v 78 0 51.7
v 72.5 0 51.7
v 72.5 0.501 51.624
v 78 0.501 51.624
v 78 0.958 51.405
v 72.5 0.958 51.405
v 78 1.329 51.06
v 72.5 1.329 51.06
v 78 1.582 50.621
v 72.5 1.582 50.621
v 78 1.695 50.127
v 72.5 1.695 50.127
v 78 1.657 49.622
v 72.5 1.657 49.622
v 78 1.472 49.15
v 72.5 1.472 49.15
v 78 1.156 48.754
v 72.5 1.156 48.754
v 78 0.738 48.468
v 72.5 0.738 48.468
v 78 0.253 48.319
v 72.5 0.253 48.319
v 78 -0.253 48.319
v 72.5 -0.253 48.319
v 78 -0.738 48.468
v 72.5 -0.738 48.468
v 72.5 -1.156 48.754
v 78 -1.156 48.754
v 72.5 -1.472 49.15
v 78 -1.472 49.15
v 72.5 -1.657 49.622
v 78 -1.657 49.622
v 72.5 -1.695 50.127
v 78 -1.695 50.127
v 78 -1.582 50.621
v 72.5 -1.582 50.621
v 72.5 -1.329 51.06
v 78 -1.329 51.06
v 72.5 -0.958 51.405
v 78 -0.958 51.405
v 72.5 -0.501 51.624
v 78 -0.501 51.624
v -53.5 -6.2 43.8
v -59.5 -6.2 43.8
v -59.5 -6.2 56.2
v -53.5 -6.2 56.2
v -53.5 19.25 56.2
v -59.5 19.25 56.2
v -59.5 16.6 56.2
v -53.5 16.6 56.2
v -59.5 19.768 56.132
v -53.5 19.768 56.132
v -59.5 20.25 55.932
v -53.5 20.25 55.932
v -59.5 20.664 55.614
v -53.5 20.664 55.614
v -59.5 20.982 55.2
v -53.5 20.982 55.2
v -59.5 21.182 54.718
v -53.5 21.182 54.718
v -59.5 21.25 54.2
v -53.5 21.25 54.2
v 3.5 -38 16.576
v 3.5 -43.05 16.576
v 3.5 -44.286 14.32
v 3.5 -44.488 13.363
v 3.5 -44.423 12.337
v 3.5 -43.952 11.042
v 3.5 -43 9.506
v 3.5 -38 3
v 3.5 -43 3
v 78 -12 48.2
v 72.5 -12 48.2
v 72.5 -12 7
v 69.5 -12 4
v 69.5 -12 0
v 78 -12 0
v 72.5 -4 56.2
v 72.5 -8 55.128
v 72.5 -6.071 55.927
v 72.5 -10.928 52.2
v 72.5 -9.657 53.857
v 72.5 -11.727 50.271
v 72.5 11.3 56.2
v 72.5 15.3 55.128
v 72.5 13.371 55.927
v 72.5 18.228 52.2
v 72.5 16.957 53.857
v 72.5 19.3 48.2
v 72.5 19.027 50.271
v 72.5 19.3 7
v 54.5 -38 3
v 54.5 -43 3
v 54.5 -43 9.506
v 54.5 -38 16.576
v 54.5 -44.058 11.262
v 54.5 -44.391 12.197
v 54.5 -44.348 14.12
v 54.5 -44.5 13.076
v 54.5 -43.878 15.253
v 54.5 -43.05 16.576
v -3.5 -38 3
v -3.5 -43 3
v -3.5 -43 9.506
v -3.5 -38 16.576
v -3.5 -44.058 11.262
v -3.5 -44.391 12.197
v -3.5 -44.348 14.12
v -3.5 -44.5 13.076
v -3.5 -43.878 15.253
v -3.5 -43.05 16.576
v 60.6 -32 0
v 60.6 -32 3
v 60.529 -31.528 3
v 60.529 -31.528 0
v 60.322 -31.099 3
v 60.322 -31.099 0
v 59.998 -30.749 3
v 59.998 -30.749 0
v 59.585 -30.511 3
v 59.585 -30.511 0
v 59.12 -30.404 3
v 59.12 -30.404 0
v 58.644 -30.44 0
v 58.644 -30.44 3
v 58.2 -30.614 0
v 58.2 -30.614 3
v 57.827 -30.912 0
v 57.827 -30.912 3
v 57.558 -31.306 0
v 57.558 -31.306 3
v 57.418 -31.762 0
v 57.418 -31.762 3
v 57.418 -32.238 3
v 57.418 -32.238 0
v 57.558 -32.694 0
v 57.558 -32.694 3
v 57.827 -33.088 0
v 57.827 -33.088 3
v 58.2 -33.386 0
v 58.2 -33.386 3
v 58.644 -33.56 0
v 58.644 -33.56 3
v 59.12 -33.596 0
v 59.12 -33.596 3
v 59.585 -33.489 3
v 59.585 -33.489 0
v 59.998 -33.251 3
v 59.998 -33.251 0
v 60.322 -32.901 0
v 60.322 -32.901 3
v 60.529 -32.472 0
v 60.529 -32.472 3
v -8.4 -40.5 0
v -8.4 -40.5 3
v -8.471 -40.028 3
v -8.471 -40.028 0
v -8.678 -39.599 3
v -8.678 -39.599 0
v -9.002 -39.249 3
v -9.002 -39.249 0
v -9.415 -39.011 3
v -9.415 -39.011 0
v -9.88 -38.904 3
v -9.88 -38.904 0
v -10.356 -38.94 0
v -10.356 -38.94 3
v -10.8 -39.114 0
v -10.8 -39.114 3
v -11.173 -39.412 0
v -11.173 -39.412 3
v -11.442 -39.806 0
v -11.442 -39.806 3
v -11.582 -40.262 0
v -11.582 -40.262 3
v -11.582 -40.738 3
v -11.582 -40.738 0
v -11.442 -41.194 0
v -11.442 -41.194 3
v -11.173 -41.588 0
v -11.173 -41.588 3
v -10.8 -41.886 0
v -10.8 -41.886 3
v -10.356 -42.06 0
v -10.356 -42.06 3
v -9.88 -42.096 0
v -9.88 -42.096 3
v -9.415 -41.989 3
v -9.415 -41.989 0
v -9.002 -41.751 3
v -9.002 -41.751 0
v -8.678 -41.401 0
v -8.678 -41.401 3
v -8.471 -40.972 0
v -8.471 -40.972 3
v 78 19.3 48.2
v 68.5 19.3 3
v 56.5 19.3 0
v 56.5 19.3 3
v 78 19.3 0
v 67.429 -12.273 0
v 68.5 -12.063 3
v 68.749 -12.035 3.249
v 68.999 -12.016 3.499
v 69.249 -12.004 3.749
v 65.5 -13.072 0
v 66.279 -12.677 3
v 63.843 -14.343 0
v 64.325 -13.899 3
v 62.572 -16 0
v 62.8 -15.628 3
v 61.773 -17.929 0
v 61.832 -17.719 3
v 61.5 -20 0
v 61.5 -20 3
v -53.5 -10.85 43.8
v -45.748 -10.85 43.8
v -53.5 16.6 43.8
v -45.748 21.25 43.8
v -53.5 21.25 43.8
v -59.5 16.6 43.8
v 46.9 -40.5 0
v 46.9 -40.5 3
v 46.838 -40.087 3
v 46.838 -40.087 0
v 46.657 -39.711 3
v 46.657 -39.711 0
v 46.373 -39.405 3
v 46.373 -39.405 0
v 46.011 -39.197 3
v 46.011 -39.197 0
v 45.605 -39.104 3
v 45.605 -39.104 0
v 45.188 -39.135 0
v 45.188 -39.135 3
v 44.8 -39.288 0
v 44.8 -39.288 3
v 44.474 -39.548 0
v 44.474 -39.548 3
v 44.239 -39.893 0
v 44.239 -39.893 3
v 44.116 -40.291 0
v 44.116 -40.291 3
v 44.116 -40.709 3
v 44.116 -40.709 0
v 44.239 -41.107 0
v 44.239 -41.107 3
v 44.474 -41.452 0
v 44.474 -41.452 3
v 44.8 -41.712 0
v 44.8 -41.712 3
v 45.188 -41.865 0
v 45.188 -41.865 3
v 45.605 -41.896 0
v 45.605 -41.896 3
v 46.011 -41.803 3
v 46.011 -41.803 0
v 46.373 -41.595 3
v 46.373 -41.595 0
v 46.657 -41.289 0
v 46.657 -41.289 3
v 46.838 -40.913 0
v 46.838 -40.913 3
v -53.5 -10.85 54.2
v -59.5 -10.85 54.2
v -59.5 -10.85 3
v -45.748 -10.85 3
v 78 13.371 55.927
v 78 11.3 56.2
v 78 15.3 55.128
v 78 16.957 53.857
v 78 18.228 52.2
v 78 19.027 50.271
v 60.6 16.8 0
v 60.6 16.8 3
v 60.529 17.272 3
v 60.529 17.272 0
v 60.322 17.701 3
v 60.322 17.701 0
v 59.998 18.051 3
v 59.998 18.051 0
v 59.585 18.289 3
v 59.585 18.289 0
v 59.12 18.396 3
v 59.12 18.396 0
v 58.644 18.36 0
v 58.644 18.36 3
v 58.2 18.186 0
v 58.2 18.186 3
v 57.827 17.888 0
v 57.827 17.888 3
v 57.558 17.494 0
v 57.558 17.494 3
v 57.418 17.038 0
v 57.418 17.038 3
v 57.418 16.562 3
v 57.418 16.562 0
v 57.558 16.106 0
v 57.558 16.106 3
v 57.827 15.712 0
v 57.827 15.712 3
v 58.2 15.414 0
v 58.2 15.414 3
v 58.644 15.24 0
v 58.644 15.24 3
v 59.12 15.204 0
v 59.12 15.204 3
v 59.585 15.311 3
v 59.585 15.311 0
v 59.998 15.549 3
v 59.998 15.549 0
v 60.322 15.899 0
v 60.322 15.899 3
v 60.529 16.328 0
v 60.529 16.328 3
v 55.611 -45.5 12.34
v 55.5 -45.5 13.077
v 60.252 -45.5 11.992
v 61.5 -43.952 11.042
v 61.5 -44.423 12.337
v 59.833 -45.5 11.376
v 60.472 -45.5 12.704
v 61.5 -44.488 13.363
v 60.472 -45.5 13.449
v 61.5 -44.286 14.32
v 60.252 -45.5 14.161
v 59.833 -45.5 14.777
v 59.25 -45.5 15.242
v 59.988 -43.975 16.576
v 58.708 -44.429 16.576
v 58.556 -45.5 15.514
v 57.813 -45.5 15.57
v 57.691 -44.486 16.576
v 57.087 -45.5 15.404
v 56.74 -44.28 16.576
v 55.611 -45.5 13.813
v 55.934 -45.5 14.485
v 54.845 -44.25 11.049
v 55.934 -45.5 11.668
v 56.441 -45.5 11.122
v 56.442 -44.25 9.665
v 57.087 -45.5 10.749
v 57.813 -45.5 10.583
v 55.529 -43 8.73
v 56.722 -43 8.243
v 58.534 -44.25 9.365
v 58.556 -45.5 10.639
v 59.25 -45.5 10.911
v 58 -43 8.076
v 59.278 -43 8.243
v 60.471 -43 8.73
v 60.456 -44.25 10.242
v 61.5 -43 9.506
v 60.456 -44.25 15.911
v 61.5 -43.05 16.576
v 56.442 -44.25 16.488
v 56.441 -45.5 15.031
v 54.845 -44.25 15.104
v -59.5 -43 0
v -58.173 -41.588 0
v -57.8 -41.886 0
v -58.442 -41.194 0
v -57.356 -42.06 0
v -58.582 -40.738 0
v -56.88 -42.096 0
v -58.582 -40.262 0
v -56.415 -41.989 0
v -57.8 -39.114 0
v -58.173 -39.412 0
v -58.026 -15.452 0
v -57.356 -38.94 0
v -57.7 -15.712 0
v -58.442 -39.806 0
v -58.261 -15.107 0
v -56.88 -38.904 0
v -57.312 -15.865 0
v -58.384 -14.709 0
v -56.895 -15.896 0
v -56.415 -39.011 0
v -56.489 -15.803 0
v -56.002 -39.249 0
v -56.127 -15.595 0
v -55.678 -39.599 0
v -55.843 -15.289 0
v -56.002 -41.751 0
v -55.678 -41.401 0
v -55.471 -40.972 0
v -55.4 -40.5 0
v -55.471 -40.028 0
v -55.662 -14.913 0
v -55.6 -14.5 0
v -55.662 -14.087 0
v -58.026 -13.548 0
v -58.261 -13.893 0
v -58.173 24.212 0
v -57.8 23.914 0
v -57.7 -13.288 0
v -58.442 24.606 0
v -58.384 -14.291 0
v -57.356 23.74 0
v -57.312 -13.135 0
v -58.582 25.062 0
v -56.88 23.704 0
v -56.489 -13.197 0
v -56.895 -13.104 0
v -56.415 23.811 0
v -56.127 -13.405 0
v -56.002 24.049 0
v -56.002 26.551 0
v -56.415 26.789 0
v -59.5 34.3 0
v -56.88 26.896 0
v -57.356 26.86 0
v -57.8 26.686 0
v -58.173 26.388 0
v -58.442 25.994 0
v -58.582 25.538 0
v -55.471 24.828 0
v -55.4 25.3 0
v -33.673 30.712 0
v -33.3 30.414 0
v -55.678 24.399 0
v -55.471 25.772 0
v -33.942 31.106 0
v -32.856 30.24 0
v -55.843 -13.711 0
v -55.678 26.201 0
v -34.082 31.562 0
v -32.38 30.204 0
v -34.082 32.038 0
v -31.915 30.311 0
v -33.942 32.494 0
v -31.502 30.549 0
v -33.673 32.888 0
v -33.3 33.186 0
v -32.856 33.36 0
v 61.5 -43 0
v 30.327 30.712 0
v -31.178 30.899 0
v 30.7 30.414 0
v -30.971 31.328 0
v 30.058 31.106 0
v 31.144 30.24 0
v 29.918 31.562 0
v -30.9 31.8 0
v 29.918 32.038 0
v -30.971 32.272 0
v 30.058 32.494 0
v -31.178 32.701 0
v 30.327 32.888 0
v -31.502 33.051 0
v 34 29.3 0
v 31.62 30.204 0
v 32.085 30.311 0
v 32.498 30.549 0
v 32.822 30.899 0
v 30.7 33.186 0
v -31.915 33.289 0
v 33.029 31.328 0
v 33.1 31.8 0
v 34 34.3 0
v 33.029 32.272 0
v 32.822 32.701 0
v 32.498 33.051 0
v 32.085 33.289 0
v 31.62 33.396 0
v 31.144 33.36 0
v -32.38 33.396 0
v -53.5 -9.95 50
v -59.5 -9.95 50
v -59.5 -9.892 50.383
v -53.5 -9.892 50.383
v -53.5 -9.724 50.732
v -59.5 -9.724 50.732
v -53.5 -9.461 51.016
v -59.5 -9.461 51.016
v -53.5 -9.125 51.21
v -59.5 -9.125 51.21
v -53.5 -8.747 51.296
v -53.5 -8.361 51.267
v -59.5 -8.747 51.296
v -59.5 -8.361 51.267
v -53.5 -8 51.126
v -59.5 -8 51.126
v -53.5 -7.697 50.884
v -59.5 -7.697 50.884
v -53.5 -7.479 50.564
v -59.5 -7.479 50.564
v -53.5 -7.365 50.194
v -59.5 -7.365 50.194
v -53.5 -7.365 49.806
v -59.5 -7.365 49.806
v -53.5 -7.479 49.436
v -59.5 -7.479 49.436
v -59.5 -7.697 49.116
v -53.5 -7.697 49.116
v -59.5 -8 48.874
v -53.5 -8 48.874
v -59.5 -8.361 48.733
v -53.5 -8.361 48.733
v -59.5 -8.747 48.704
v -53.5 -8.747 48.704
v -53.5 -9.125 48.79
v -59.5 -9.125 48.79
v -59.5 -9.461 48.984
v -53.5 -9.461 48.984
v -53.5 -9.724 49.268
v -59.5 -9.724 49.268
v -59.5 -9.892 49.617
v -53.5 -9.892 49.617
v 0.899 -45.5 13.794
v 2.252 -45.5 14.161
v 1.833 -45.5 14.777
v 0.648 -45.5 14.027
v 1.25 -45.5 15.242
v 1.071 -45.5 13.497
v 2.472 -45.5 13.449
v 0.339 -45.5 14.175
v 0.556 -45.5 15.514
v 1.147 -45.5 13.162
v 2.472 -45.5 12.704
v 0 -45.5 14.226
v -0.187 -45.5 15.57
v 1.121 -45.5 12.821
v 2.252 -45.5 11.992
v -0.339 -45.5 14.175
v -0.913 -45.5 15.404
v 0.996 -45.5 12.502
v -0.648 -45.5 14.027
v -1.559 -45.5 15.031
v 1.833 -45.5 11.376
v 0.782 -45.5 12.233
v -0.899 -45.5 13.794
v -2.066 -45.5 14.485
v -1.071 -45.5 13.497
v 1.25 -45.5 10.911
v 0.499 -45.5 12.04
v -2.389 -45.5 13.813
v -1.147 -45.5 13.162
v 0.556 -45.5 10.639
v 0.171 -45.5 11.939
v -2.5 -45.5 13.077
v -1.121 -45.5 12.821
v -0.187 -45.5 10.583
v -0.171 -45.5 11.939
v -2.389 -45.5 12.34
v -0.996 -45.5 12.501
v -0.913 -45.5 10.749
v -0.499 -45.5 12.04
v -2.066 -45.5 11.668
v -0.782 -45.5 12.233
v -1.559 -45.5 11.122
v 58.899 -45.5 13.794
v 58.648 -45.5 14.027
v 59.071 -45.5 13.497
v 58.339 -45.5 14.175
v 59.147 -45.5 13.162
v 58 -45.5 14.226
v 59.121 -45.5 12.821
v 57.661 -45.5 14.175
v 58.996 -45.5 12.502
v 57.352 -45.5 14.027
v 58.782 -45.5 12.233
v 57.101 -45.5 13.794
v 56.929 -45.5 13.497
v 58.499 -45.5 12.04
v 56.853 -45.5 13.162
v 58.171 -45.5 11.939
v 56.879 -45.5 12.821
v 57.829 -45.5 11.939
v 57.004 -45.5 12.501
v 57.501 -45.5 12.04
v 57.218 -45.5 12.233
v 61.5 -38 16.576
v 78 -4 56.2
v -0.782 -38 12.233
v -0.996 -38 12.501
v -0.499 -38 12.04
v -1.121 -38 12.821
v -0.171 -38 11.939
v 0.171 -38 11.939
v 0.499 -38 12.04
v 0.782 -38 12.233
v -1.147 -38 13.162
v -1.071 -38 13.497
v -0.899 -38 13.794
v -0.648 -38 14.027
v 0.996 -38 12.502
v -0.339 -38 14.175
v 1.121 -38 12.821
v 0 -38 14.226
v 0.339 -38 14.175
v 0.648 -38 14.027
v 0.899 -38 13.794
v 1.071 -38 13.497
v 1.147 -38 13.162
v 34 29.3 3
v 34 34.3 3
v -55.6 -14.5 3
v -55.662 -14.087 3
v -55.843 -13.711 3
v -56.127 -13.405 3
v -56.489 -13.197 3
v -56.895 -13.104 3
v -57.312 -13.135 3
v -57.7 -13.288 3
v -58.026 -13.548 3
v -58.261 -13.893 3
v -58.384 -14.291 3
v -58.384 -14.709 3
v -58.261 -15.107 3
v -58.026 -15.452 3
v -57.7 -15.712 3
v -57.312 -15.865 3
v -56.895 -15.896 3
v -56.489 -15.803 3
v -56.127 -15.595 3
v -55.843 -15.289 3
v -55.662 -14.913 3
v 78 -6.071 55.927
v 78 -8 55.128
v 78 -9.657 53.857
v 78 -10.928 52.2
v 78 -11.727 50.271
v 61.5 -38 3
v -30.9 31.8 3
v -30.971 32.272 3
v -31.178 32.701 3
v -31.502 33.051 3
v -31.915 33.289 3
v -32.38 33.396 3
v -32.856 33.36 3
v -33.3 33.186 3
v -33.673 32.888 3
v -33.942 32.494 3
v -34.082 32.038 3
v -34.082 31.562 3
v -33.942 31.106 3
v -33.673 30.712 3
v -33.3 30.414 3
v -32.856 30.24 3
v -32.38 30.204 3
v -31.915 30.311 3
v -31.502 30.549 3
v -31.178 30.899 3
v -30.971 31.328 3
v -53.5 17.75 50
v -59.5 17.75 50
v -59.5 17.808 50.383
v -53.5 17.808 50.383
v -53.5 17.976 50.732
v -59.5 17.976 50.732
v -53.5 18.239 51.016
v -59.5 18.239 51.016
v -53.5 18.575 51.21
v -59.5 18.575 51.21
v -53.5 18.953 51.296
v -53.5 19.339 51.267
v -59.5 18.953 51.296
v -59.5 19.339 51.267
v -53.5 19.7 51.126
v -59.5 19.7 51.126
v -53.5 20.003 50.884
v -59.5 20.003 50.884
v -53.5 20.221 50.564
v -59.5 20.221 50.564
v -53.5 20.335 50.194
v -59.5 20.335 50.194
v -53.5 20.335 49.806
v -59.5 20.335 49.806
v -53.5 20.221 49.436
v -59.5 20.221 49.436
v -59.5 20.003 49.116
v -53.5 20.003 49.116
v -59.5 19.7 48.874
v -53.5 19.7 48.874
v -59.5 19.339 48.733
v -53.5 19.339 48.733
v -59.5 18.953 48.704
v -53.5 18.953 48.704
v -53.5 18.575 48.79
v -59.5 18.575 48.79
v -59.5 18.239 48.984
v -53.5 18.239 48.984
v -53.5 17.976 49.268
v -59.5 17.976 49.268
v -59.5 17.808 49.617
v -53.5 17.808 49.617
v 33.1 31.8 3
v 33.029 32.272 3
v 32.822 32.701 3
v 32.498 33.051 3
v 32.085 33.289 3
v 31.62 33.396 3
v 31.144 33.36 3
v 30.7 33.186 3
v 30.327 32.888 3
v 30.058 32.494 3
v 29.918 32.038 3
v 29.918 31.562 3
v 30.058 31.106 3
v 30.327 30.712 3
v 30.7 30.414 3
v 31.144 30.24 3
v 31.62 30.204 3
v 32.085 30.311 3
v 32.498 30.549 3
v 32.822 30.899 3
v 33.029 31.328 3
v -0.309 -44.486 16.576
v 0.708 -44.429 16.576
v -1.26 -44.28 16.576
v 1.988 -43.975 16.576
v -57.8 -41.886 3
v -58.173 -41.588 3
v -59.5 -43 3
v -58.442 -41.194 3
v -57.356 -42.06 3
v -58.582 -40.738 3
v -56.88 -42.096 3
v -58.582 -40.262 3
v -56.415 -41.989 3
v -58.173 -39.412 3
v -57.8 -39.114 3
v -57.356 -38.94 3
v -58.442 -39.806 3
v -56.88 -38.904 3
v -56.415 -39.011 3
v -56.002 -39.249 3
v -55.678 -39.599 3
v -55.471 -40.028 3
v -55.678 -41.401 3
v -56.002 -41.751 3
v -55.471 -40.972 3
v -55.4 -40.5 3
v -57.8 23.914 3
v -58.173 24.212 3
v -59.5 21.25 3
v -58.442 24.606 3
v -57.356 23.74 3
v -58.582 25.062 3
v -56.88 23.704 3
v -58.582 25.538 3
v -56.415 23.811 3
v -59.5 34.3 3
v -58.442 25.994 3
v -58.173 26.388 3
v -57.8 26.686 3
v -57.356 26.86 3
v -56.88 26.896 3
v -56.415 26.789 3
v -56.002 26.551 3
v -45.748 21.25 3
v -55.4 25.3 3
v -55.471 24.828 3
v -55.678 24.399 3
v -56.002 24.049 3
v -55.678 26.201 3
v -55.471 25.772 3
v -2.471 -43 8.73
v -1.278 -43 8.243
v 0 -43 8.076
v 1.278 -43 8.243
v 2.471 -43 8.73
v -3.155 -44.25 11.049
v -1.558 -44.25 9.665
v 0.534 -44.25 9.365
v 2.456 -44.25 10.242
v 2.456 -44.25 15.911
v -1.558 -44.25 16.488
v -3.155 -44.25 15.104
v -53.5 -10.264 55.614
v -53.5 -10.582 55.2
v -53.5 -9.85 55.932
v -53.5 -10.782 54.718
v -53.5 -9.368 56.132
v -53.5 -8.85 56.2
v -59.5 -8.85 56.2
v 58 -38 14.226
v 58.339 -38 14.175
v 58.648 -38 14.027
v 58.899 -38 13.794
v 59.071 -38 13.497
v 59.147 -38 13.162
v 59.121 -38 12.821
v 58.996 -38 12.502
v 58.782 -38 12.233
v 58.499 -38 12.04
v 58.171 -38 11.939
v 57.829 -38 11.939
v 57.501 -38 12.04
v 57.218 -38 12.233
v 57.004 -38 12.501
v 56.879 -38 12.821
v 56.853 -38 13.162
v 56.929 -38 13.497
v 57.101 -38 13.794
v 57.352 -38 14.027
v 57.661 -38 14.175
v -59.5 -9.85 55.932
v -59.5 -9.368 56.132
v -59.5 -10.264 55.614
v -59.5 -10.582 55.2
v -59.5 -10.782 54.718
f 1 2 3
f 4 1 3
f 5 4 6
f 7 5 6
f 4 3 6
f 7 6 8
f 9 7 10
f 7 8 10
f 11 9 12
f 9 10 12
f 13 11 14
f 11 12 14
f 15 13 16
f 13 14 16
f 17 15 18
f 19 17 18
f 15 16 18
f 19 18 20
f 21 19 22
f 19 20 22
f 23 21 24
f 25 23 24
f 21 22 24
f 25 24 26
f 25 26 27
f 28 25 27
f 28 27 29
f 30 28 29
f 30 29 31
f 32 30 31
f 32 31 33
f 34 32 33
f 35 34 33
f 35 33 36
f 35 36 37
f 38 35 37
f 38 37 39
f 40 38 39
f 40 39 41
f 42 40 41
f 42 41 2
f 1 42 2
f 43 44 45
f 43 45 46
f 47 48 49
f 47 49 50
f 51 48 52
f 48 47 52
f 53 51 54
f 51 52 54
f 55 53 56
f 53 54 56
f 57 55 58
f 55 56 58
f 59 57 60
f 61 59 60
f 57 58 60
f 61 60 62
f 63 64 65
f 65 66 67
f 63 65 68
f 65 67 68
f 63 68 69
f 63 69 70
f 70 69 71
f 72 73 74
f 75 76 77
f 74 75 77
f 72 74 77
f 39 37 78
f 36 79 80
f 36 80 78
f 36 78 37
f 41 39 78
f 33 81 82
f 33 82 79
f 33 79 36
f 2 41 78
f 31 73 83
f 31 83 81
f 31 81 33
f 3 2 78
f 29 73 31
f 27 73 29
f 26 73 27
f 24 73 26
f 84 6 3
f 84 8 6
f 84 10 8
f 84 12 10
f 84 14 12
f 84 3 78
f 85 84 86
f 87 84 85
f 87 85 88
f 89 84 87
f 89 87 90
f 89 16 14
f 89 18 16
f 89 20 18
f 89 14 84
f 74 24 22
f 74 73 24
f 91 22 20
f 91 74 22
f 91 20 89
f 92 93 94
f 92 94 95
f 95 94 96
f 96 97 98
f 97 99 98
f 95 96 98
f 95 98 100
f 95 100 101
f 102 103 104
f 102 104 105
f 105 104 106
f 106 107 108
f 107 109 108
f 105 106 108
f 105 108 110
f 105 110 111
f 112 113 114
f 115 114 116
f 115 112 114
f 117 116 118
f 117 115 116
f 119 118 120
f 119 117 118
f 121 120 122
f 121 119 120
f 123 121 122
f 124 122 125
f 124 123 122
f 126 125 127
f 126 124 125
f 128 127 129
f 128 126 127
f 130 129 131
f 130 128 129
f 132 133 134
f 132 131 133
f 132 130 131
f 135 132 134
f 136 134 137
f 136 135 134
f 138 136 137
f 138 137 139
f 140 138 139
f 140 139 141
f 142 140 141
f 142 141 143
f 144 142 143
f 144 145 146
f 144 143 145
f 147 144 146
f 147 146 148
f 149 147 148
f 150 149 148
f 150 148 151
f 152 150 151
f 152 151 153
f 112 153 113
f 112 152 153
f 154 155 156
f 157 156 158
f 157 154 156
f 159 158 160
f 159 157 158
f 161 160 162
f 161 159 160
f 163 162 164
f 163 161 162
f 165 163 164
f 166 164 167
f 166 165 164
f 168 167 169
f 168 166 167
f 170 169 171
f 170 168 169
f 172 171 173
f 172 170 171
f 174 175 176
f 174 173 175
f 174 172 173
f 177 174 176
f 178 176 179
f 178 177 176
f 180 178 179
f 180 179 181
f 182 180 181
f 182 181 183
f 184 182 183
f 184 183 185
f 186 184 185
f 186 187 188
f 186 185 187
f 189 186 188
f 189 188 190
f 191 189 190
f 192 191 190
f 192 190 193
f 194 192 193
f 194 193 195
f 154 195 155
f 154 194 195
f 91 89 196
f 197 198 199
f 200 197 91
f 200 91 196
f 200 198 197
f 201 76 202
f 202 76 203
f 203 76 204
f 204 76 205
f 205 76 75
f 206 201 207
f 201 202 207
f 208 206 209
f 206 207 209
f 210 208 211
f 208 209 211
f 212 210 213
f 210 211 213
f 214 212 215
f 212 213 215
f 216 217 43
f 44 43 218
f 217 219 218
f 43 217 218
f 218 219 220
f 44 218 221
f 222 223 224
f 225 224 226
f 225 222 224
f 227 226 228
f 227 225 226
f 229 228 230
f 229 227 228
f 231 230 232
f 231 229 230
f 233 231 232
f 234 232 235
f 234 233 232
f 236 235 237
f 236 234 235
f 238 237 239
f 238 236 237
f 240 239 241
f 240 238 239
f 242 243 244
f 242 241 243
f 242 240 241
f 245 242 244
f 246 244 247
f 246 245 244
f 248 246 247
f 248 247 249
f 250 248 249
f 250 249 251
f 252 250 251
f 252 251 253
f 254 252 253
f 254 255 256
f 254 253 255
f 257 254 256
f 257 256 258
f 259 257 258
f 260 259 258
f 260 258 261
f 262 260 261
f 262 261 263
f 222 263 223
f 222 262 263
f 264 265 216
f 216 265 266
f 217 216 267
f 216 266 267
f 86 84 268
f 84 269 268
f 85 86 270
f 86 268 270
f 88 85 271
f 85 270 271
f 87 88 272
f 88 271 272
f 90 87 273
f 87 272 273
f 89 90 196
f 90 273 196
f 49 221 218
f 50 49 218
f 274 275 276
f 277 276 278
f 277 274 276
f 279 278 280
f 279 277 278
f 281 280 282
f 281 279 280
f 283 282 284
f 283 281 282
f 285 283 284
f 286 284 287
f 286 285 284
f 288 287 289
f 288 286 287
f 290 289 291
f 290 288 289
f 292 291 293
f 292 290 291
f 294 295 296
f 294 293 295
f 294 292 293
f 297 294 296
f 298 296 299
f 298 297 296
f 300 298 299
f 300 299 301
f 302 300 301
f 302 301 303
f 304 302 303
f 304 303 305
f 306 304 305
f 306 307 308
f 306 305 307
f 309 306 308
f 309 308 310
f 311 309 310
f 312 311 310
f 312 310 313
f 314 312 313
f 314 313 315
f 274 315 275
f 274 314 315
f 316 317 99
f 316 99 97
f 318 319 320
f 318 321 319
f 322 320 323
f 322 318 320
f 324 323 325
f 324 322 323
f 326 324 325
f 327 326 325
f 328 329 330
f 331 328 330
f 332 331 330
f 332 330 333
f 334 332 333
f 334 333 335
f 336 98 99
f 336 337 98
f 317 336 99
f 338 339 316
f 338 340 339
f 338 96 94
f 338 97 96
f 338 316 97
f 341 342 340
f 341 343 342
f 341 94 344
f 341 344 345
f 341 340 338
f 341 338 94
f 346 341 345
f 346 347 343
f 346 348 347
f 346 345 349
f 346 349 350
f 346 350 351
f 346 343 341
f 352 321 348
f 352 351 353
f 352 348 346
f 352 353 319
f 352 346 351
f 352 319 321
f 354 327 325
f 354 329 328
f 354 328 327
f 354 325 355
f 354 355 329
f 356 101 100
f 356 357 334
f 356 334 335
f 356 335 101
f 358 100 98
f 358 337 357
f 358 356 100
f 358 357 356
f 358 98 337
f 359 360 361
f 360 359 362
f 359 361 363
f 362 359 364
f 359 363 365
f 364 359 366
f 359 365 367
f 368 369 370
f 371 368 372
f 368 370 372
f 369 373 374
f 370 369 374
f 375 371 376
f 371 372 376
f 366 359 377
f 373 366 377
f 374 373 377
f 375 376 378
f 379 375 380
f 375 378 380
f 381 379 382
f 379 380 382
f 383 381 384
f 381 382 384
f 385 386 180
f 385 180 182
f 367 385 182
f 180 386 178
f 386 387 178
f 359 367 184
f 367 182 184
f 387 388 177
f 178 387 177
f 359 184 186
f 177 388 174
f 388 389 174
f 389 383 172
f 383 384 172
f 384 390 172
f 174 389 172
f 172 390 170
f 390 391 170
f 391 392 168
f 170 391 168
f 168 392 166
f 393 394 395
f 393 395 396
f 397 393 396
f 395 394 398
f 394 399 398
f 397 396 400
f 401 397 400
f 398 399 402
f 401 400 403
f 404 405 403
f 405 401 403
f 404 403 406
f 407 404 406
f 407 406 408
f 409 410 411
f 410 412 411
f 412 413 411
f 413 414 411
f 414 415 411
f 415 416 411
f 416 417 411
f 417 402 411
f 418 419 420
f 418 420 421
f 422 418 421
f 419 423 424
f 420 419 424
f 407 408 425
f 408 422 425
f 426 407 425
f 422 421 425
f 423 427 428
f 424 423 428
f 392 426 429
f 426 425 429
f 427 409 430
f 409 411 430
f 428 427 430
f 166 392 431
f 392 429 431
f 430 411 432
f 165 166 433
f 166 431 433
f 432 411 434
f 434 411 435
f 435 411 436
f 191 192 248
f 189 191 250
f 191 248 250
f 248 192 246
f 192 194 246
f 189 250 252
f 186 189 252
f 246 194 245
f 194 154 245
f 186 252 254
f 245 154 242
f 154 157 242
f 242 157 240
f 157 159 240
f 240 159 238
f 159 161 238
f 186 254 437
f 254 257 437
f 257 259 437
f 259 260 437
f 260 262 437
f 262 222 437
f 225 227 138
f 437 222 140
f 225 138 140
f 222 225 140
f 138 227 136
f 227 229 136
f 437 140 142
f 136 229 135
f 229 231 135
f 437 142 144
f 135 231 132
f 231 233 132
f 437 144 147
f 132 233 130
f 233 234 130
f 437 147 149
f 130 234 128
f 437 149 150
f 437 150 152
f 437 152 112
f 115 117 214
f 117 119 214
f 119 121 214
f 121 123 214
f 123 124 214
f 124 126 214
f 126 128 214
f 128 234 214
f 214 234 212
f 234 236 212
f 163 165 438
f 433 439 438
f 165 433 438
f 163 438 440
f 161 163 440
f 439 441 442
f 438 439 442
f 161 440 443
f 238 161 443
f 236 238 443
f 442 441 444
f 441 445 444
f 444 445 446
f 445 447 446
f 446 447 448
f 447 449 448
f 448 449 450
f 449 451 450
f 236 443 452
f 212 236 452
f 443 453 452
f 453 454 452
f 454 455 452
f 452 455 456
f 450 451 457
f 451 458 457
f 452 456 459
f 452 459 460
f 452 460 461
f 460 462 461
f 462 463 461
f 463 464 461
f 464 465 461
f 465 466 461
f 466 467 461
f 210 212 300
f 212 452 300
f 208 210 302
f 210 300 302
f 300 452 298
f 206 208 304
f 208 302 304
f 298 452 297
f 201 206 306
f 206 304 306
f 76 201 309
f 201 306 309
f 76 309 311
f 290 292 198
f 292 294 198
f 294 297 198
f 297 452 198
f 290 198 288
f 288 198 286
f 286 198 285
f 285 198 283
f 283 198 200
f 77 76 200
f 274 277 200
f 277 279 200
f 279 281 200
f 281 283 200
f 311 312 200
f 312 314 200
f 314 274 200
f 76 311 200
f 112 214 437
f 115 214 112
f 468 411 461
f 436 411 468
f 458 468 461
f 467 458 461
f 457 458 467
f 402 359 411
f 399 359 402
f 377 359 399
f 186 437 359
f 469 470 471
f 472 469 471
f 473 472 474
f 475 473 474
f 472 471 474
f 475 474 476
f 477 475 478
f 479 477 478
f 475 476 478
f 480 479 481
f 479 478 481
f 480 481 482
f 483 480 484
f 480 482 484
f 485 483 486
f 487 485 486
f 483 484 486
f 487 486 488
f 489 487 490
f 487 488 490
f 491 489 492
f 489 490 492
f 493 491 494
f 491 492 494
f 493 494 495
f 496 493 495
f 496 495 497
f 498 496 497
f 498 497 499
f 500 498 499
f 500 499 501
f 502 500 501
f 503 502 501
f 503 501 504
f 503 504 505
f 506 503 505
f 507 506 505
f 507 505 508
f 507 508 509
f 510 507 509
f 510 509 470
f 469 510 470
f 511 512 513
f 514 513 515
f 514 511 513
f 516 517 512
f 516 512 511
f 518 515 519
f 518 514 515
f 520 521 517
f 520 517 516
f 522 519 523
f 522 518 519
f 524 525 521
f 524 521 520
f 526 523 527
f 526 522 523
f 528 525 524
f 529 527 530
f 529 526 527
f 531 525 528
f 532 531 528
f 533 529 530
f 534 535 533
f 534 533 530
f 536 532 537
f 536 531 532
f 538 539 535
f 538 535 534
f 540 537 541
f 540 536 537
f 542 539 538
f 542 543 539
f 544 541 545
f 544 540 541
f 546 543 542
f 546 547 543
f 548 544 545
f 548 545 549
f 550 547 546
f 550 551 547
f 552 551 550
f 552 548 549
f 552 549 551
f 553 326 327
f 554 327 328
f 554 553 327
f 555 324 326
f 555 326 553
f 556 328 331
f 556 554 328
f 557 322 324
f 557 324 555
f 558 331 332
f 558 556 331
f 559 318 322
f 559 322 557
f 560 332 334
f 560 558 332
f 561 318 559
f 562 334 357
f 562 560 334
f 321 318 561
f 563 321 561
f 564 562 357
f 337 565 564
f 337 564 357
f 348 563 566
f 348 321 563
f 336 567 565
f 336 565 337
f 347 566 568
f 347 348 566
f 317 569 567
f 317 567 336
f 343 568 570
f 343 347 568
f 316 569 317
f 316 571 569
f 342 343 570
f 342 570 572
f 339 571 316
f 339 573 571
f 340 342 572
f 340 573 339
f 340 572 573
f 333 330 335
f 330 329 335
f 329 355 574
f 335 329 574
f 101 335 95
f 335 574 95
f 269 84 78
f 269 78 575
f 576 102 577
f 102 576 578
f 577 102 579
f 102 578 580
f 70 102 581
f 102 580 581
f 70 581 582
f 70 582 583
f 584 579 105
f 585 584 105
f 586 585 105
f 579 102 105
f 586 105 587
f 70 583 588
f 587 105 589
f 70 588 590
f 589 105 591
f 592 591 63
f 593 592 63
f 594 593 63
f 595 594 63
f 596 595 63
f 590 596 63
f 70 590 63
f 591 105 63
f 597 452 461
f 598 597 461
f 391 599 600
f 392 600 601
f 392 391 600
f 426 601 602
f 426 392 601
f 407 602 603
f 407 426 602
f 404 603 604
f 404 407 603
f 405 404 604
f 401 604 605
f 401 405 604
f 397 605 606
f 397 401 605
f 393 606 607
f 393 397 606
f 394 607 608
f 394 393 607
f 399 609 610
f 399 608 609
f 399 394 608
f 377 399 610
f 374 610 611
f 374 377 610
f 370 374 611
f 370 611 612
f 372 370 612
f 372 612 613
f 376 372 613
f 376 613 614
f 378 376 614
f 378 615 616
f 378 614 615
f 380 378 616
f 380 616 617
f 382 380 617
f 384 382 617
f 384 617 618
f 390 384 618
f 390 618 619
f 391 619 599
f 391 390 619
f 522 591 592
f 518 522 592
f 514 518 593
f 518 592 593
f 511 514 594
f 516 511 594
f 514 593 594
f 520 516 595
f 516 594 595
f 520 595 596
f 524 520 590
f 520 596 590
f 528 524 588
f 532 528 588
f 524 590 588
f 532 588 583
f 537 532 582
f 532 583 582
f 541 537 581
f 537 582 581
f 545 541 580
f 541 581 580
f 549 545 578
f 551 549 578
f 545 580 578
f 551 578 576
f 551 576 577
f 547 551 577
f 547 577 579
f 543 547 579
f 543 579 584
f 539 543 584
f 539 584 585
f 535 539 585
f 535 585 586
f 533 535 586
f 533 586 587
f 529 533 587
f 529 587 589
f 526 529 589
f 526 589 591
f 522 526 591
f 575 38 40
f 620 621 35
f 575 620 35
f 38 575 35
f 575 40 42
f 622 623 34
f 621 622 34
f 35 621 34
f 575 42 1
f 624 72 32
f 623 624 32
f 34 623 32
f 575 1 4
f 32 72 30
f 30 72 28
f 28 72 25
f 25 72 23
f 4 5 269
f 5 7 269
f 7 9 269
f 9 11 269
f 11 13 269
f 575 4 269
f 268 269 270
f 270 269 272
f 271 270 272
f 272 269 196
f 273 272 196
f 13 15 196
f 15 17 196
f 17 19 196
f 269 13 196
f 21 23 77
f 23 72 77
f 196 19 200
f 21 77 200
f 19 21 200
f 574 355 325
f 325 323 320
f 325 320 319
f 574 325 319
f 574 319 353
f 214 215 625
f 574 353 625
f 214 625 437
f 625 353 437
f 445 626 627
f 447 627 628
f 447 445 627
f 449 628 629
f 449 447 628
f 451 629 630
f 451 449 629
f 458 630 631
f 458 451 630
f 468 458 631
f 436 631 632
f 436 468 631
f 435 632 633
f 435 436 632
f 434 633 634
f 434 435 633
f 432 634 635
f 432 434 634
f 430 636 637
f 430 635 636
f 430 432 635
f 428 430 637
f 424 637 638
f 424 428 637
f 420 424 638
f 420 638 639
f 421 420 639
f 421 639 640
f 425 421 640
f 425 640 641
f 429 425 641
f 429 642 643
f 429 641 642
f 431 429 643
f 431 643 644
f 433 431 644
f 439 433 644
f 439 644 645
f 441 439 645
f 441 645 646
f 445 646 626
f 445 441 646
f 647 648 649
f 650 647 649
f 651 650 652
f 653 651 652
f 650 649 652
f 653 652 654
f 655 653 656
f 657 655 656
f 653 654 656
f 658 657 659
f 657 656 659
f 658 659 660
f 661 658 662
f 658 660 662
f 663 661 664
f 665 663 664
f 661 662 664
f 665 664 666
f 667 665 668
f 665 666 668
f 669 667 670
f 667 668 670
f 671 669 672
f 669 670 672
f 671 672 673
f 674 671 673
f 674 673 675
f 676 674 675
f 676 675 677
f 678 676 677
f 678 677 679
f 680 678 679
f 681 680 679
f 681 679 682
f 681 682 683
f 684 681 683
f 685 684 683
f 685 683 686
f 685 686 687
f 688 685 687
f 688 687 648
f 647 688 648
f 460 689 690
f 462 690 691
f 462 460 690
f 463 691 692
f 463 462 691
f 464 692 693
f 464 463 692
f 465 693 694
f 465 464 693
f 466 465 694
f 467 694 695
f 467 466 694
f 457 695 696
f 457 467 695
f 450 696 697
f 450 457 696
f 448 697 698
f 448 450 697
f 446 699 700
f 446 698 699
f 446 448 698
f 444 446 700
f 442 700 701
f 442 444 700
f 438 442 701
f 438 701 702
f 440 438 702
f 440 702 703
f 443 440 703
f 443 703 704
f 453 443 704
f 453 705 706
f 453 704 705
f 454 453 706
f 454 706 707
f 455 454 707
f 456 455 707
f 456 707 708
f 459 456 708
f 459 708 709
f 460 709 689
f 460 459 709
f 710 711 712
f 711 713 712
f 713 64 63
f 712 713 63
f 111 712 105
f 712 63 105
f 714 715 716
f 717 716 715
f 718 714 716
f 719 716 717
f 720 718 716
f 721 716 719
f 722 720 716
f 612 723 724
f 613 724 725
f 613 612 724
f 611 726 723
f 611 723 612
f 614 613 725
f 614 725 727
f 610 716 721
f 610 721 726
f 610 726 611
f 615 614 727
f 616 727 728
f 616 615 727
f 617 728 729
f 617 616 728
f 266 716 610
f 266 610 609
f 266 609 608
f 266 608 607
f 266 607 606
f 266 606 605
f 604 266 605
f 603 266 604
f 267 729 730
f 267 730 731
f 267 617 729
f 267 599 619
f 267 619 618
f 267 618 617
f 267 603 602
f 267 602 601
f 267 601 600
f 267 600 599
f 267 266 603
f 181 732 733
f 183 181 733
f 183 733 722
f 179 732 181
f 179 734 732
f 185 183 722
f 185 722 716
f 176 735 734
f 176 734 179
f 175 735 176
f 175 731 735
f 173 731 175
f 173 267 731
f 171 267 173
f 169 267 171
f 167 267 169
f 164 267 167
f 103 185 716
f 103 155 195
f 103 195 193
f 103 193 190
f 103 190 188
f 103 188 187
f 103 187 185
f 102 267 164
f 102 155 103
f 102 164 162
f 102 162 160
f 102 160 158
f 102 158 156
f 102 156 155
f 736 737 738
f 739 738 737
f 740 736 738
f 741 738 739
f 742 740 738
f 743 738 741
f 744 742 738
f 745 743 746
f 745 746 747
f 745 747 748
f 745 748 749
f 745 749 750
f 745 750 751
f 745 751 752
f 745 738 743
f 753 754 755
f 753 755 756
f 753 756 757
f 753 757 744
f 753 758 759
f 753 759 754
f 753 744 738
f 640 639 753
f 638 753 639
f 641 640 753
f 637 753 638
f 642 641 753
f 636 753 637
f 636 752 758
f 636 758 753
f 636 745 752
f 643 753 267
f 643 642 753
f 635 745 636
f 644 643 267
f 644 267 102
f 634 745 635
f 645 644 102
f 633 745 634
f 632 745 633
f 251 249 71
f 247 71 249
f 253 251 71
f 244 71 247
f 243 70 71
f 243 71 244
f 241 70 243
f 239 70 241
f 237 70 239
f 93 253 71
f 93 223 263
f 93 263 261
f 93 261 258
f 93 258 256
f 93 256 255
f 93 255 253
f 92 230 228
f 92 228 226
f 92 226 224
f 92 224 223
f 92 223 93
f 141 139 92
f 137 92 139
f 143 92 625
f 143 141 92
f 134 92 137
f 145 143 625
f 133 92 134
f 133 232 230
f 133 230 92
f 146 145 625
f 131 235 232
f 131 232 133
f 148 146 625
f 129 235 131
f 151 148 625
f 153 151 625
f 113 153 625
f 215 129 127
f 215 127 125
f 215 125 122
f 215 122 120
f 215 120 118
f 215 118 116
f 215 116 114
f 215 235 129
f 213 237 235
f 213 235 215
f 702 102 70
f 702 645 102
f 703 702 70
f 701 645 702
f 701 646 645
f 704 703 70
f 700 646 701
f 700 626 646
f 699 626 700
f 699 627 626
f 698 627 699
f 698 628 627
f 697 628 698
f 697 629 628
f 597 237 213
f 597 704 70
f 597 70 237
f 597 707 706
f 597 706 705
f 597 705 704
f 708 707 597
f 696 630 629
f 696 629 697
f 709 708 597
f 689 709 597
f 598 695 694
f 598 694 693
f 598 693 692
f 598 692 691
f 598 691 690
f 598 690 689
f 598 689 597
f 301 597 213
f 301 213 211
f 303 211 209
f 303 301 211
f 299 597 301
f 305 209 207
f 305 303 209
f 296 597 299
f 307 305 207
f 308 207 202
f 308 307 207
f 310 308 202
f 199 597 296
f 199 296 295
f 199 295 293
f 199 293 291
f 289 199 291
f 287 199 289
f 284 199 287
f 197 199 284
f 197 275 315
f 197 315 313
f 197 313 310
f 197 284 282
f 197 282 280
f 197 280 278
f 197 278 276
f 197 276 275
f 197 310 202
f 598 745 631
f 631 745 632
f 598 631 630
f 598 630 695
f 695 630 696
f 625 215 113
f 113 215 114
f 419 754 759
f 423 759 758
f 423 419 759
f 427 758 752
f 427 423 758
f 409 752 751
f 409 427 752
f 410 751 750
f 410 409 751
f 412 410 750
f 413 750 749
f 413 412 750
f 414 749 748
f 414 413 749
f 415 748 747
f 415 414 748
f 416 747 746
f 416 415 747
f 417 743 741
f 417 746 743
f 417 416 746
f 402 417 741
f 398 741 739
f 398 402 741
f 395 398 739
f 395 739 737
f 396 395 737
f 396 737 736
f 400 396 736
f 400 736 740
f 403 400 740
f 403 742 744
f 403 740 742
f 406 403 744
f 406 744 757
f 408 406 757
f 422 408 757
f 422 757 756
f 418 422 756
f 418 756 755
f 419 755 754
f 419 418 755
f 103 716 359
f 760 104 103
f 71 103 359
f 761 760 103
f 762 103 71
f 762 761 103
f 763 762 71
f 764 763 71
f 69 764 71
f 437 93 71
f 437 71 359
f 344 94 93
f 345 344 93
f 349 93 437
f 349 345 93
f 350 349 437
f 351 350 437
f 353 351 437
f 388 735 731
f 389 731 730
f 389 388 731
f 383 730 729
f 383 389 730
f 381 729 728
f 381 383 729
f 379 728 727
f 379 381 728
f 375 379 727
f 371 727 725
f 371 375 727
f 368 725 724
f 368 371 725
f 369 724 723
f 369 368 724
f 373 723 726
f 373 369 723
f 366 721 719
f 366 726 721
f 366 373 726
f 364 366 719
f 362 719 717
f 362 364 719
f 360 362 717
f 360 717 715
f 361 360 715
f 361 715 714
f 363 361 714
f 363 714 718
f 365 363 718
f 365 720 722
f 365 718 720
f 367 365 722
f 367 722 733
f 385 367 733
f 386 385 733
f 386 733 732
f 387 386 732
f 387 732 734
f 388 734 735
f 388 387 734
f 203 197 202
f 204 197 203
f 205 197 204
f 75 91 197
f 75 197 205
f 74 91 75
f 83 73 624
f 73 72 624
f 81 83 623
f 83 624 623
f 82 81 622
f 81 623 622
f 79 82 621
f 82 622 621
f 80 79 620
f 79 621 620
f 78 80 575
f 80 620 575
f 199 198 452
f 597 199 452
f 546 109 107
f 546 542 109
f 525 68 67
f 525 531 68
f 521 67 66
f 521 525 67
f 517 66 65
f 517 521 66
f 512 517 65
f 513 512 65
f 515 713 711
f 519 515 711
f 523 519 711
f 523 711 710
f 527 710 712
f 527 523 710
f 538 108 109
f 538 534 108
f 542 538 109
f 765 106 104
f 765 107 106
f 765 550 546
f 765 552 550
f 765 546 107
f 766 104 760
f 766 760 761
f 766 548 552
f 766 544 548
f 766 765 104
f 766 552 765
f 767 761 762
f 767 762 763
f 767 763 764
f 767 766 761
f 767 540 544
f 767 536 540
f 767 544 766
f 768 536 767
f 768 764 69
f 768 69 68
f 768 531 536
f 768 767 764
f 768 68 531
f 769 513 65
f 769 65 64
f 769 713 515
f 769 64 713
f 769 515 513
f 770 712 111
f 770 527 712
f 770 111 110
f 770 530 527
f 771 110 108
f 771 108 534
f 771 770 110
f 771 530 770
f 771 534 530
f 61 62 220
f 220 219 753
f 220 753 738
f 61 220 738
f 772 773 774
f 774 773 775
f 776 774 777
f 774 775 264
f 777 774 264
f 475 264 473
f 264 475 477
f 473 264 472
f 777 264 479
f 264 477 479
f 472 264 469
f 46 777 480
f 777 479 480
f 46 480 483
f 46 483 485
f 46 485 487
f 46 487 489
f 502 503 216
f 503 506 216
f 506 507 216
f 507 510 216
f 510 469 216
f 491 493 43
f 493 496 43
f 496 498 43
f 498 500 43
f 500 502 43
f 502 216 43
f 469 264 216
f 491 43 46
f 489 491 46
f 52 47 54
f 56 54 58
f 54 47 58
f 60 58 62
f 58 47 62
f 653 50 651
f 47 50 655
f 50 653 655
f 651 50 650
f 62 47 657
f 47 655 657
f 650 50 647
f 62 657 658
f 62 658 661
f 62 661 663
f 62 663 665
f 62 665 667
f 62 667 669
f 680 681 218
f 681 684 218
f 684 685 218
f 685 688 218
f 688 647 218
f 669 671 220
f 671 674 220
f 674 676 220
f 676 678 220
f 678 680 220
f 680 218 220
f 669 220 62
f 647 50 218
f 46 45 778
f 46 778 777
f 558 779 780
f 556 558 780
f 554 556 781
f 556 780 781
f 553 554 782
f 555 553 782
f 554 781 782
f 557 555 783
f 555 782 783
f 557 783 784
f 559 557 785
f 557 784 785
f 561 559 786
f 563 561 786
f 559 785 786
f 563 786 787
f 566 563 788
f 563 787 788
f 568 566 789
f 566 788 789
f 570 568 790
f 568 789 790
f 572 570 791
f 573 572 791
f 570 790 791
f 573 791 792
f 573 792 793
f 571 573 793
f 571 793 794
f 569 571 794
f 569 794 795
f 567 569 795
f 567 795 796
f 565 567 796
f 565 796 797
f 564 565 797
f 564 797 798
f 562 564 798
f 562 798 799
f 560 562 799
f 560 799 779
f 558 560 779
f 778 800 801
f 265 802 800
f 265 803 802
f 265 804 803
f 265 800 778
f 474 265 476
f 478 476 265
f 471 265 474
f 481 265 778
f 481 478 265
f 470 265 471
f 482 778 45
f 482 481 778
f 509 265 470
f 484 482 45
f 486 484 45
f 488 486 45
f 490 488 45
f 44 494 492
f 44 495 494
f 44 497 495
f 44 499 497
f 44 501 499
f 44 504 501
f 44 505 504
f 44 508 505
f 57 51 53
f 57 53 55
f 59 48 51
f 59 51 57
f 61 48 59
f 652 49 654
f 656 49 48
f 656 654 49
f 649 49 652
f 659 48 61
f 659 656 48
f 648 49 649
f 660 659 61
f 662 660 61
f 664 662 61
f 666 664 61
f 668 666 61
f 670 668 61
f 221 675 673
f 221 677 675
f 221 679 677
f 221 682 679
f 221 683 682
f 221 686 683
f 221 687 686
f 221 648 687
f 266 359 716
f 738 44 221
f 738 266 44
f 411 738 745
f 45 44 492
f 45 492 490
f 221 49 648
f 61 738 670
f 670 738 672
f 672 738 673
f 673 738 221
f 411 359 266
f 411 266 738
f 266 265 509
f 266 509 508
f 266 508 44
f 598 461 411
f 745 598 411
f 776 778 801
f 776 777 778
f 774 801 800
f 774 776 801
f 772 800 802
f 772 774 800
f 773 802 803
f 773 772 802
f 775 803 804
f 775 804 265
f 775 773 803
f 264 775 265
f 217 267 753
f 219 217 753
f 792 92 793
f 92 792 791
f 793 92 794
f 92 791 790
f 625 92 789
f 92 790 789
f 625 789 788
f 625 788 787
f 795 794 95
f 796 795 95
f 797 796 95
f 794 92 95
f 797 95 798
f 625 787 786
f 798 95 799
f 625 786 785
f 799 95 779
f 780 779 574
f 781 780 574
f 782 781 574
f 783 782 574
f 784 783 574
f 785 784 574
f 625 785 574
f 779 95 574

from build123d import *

# Parameters (mm, degrees)
BASE_DEPTH          = 3
SERVO_SUPPORT_DEPTH = 43.8
SKETCH21_W          = 6
SKETCH21_H          = 4.65
SERVO_MOUNTS_DEPTH  = 12.4
SERVO_SCREWS_REACH  = 142.173
SKETCH22_R          = 1.3
FILLET1_R           = 2
SKETCH23_W          = 16.5
SKETCH23_H          = 31.3
SHAFT_SUPPORT_DEPTH = 3
SKETCH24_W          = 5.5
SKETCH24_H          = 31.3
BOSS_EXTRUDE6_DEPTH = 56.2
FILLET2_R           = 8
FILLET3_R           = 8
SHAFT_REACH         = 151.771
SKETCH25_R          = 1.7
SCREWS_REACH        = 107.316
SKETCH26_R          = 1.6
SKETCH26_R_2        = 1.4
SKETCH31_W          = 7
SKETCH31_H          = 13.5765
BOSS_EXTRUDE8_DEPTH = 5
SKETCH30_R          = 2.5
BOSS_EXTRUDE9_DEPTH = 2.5
CUT_EXTRUDE1_REACH  = 122.29
SKETCH32_R          = 1.15
CHAMFER1_SIZE       = 2.5
CHAMFER2_SIZE       = 4


with BuildPart() as part:
    # Sketch19 → Base (new body)
    with BuildSketch(Plane.XY):
        Polygon((61.5, 19.3), (56.5, 19.3), (34, 29.3), (34, 34.3), (-59.5, 34.3), (-59.5, -43), (61.5, -43), align=None)
    extrude(amount=BASE_DEPTH)

    # Sketch20 → Servo support (add)
    with BuildSketch(Plane.XY):
        Polygon((-53.298152188, -10.85), (-55.448152188, -10.85), (-59.5, -10.85), (-59.5, 21.25), (-55.448152188, 21.25), (-53.298152188, 21.25), (-45.748152188, 21.25), (-45.748152188, 8.609473612), (-45.748152188, -10.85), align=None)
    extrude(amount=SERVO_SUPPORT_DEPTH)

    # Sketch21 → Servo mounts (add)
    with BuildSketch(Plane.XY.offset(43.8)):
        with Locations((-56.5, -8.525)):
            Rectangle(SKETCH21_W, SKETCH21_H)
        with Locations((-56.5, 18.925)):
            Rectangle(SKETCH21_W, SKETCH21_H)
    extrude(amount=SERVO_MOUNTS_DEPTH)

    # Sketch22 → Servo screws (cut, up to next)
    with BuildSketch(Plane.ZY.offset(59.5), mode=Mode.PRIVATE) as servo_screws_sk1:
        with Locations(Location((50, -8.65, 0), (0, 0, 270))):
            Circle(SKETCH22_R)
    servo_screws_tool1 = extrude(servo_screws_sk1.sketch, amount=-SERVO_SCREWS_REACH, mode=Mode.PRIVATE) & part.part
    # Sketch22 → Servo screws (cut, up to next)
    with BuildSketch(Plane.ZY.offset(59.5), mode=Mode.PRIVATE) as servo_screws_sk2:
        with Locations(Location((50, 19.05, 0), (0, 0, 270))):
            Circle(SKETCH22_R)
    servo_screws_tool2 = extrude(servo_screws_sk2.sketch, amount=-SERVO_SCREWS_REACH, mode=Mode.PRIVATE) & part.part
    add(servo_screws_tool1.solids().sort_by_distance((-59.5, -8.65, 50))[0], mode=Mode.SUBTRACT)
    add(servo_screws_tool2.solids().sort_by_distance((-59.5, 19.05, 50))[0], mode=Mode.SUBTRACT)

    # Fillet1
    fillet1_edges = [part.edges().sort_by_distance(p)[0] for p in [
        (-56.5, 21.25, 56.2),
        (-56.5, -10.85, 56.2),
    ]]
    fillet(fillet1_edges, radius=FILLET1_R)

    # Sketch23 → Shaft support (add)
    with BuildSketch(Plane.XY):
        with Locations((69.75, 3.65)):
            Rectangle(SKETCH23_W, SKETCH23_H)
    extrude(amount=SHAFT_SUPPORT_DEPTH)

    # Sketch24 → Boss-Extrude6 (add)
    with BuildSketch(Plane.XY):
        with Locations((75.25, 3.65)):
            Rectangle(SKETCH24_W, SKETCH24_H)
    extrude(amount=BOSS_EXTRUDE6_DEPTH)

    # Fillet2
    fillet2_edges = [part.edges().sort_by_distance(p)[0] for p in [
        (61.5, -12, 1.5),
    ]]
    fillet(fillet2_edges, radius=FILLET2_R)

    # Fillet3
    fillet3_edges = [part.edges().sort_by_distance(p)[0] for p in [
        (75.25, 19.3, 56.2),
        (75.25, -12, 56.2),
    ]]
    fillet(fillet3_edges, radius=FILLET3_R)

    # Sketch25 → Shaft (cut, up to next)
    with BuildSketch(Plane.ZY.offset(-72.5), mode=Mode.PRIVATE) as shaft_sk1:
        with Locations((50, 0)):
            Circle(SKETCH25_R)
    shaft_tool1 = extrude(shaft_sk1.sketch, amount=-SHAFT_REACH, mode=Mode.PRIVATE) & part.part
    add(shaft_tool1.solids().sort_by_distance((72.5, 0, 50))[0], mode=Mode.SUBTRACT)

    # Sketch26 → Screws (cut, up to next)
    with BuildSketch(Plane.XY, mode=Mode.PRIVATE) as screws_sk1:
        with Locations((-57, -40.5)):
            Circle(SKETCH26_R)
    screws_tool1 = extrude(screws_sk1.sketch, amount=SCREWS_REACH, mode=Mode.PRIVATE) & part.part
    # Sketch26 → Screws (cut, up to next)
    with BuildSketch(Plane.XY, mode=Mode.PRIVATE) as screws_sk2:
        with Locations((-10, -40.5)):
            Circle(SKETCH26_R)
    screws_tool2 = extrude(screws_sk2.sketch, amount=SCREWS_REACH, mode=Mode.PRIVATE) & part.part
    # Sketch26 → Screws (cut, up to next)
    with BuildSketch(Plane.XY, mode=Mode.PRIVATE) as screws_sk3:
        with Locations((59, -32)):
            Circle(SKETCH26_R)
    screws_tool3 = extrude(screws_sk3.sketch, amount=SCREWS_REACH, mode=Mode.PRIVATE) & part.part
    # Sketch26 → Screws (cut, up to next)
    with BuildSketch(Plane.XY, mode=Mode.PRIVATE) as screws_sk4:
        with Locations((59, 16.8)):
            Circle(SKETCH26_R)
    screws_tool4 = extrude(screws_sk4.sketch, amount=SCREWS_REACH, mode=Mode.PRIVATE) & part.part
    # Sketch26 → Screws (cut, up to next)
    with BuildSketch(Plane.XY, mode=Mode.PRIVATE) as screws_sk5:
        with Locations((31.5, 31.8)):
            Circle(SKETCH26_R)
    screws_tool5 = extrude(screws_sk5.sketch, amount=SCREWS_REACH, mode=Mode.PRIVATE) & part.part
    # Sketch26 → Screws (cut, up to next)
    with BuildSketch(Plane.XY, mode=Mode.PRIVATE) as screws_sk6:
        with Locations((-32.5, 31.8)):
            Circle(SKETCH26_R)
    screws_tool6 = extrude(screws_sk6.sketch, amount=SCREWS_REACH, mode=Mode.PRIVATE) & part.part
    # Sketch26 → Screws (cut, up to next)
    with BuildSketch(Plane.XY, mode=Mode.PRIVATE) as screws_sk7:
        with Locations((-57, 25.3)):
            Circle(SKETCH26_R)
    screws_tool7 = extrude(screws_sk7.sketch, amount=SCREWS_REACH, mode=Mode.PRIVATE) & part.part
    # Sketch26 → Screws (cut, up to next)
    with BuildSketch(Plane.XY, mode=Mode.PRIVATE) as screws_sk8:
        with Locations((-57, -14.5)):
            Circle(SKETCH26_R_2)
    screws_tool8 = extrude(screws_sk8.sketch, amount=SCREWS_REACH, mode=Mode.PRIVATE) & part.part
    # Sketch26 → Screws (cut, up to next)
    with BuildSketch(Plane.XY, mode=Mode.PRIVATE) as screws_sk9:
        with Locations((45.5, -40.5)):
            Circle(SKETCH26_R_2)
    screws_tool9 = extrude(screws_sk9.sketch, amount=SCREWS_REACH, mode=Mode.PRIVATE) & part.part
    add(screws_tool1.solids().sort_by_distance((-57, -40.5, 0))[0], mode=Mode.SUBTRACT)
    add(screws_tool2.solids().sort_by_distance((-10, -40.5, 0))[0], mode=Mode.SUBTRACT)
    add(screws_tool3.solids().sort_by_distance((59, -32, 0))[0], mode=Mode.SUBTRACT)
    add(screws_tool4.solids().sort_by_distance((59, 16.8, 0))[0], mode=Mode.SUBTRACT)
    add(screws_tool5.solids().sort_by_distance((31.5, 31.8, 0))[0], mode=Mode.SUBTRACT)
    add(screws_tool6.solids().sort_by_distance((-32.5, 31.8, 0))[0], mode=Mode.SUBTRACT)
    add(screws_tool7.solids().sort_by_distance((-57, 25.3, 0))[0], mode=Mode.SUBTRACT)
    add(screws_tool8.solids().sort_by_distance((-57, -14.5, 0))[0], mode=Mode.SUBTRACT)
    add(screws_tool9.solids().sort_by_distance((45.5, -40.5, 0))[0], mode=Mode.SUBTRACT)

    # Sketch31 → Boss-Extrude8 (add)
    with BuildSketch(Plane.XZ.offset(43)):
        with Locations((0, 9.78825)):
            Rectangle(SKETCH31_W, SKETCH31_H)
        with Locations((58, 9.78825)):
            Rectangle(SKETCH31_W, SKETCH31_H)
    extrude(amount=-BOSS_EXTRUDE8_DEPTH)

    # Sketch30 → Boss-Extrude9 (add)
    with BuildSketch(Plane.XZ.offset(43)):
        with Locations(Location((0, 13.0765, 0), (0, 0, 180))):
            Circle(SKETCH30_R)
        with Locations(Location((58, 13.0765, 0), (0, 0, 180))):
            Circle(SKETCH30_R)
    extrude(amount=BOSS_EXTRUDE9_DEPTH)

    # Sketch32 → Cut-Extrude1 (cut, up to next)
    with BuildSketch(Plane(origin=(0, -38, 0), x_dir=(1, 0, 0), z_dir=(0, 1, 0)), mode=Mode.PRIVATE) as cut_extrude1_sk1:
        with Locations(Location((0, -13.0765, 0), (0, 0, 270))):
            Circle(SKETCH32_R)
    cut_extrude1_tool1 = extrude(cut_extrude1_sk1.sketch, amount=-CUT_EXTRUDE1_REACH, mode=Mode.PRIVATE) & part.part
    # Sketch32 → Cut-Extrude1 (cut, up to next)
    with BuildSketch(Plane(origin=(0, -38, 0), x_dir=(1, 0, 0), z_dir=(0, 1, 0)), mode=Mode.PRIVATE) as cut_extrude1_sk2:
        with Locations(Location((58, -13.0765, 0), (0, 0, 270))):
            Circle(SKETCH32_R)
    cut_extrude1_tool2 = extrude(cut_extrude1_sk2.sketch, amount=-CUT_EXTRUDE1_REACH, mode=Mode.PRIVATE) & part.part
    add(cut_extrude1_tool1.solids().sort_by_distance((0, -38, 13.0765))[0], mode=Mode.SUBTRACT)
    add(cut_extrude1_tool2.solids().sort_by_distance((58, -38, 13.0765))[0], mode=Mode.SUBTRACT)

    # Chamfer1
    # the kernel refuses this chamfer: 2.5 mm, written as the material it adds along each edge
    with BuildSketch(Plane(origin=(58, -43, 13.0765), x_dir=(-1, 0, 0), z_dir=(0, 0, 1))) as chamfer1_piece_1_section:
        Polygon((2.5 + CHAMFER1_SIZE, 0), (2.5, CHAMFER1_SIZE), (2.5, 0), align=None)
    chamfer1_piece_1 = revolve(axis=Axis((58, -43, 13.0765), (0, -1, 0)), mode=Mode.PRIVATE)
    chamfer1_piece_1 = split(chamfer1_piece_1, bisect_by=Plane(origin=(61.5, -43.330528144, 9.079752975), z_dir=(-1, 0, 0)), keep=Keep.TOP, mode=Mode.PRIVATE)
    chamfer1_piece_1 = split(chamfer1_piece_1, bisect_by=Plane(origin=(54.5, -43.330528144, 9.079752975), z_dir=(1, 0, 0)), keep=Keep.TOP, mode=Mode.PRIVATE)
    chamfer1_piece_1 = split(chamfer1_piece_1, bisect_by=Plane(origin=(55.692477029, -43.330528144, 16.5765), z_dir=(0, 0, -1)), keep=Keep.TOP, mode=Mode.PRIVATE)
    chamfer1_piece_1 = split(chamfer1_piece_1, bisect_by=Plane(origin=(55.692477029, -45.5, 9.079752975), z_dir=(0, 1, 0)), keep=Keep.TOP, mode=Mode.PRIVATE)
    add(chamfer1_piece_1)
    with BuildSketch(Plane(origin=(0, -43, 13.0765), x_dir=(-1, 0, 0), z_dir=(0, 0, 1))) as chamfer1_piece_2_section:
        Polygon((2.5 + CHAMFER1_SIZE, 0), (2.5, CHAMFER1_SIZE), (2.5, 0), align=None)
    chamfer1_piece_2 = revolve(axis=Axis((0, -43, 13.0765), (0, -1, 0)), mode=Mode.PRIVATE)
    chamfer1_piece_2 = split(chamfer1_piece_2, bisect_by=Plane(origin=(-3.5, -43.330528144, 9.079752976), z_dir=(1, 0, 0)), keep=Keep.TOP, mode=Mode.PRIVATE)
    chamfer1_piece_2 = split(chamfer1_piece_2, bisect_by=Plane(origin=(-2.30752297, -43.330528144, 16.5765), z_dir=(0, 0, -1)), keep=Keep.TOP, mode=Mode.PRIVATE)
    chamfer1_piece_2 = split(chamfer1_piece_2, bisect_by=Plane(origin=(3.5, -43.330528144, 9.079752976), z_dir=(-1, 0, 0)), keep=Keep.TOP, mode=Mode.PRIVATE)
    chamfer1_piece_2 = split(chamfer1_piece_2, bisect_by=Plane(origin=(-2.30752297, -45.5, 9.079752976), z_dir=(0, 1, 0)), keep=Keep.TOP, mode=Mode.PRIVATE)
    add(chamfer1_piece_2)

    # Chamfer2
    chamfer2_edges = [part.edges().sort_by_distance(p)[0] for p in [
        (72.5, 3.65, 3),
    ]]
    chamfer(chamfer2_edges, length=CHAMFER2_SIZE)


solid = part.part
